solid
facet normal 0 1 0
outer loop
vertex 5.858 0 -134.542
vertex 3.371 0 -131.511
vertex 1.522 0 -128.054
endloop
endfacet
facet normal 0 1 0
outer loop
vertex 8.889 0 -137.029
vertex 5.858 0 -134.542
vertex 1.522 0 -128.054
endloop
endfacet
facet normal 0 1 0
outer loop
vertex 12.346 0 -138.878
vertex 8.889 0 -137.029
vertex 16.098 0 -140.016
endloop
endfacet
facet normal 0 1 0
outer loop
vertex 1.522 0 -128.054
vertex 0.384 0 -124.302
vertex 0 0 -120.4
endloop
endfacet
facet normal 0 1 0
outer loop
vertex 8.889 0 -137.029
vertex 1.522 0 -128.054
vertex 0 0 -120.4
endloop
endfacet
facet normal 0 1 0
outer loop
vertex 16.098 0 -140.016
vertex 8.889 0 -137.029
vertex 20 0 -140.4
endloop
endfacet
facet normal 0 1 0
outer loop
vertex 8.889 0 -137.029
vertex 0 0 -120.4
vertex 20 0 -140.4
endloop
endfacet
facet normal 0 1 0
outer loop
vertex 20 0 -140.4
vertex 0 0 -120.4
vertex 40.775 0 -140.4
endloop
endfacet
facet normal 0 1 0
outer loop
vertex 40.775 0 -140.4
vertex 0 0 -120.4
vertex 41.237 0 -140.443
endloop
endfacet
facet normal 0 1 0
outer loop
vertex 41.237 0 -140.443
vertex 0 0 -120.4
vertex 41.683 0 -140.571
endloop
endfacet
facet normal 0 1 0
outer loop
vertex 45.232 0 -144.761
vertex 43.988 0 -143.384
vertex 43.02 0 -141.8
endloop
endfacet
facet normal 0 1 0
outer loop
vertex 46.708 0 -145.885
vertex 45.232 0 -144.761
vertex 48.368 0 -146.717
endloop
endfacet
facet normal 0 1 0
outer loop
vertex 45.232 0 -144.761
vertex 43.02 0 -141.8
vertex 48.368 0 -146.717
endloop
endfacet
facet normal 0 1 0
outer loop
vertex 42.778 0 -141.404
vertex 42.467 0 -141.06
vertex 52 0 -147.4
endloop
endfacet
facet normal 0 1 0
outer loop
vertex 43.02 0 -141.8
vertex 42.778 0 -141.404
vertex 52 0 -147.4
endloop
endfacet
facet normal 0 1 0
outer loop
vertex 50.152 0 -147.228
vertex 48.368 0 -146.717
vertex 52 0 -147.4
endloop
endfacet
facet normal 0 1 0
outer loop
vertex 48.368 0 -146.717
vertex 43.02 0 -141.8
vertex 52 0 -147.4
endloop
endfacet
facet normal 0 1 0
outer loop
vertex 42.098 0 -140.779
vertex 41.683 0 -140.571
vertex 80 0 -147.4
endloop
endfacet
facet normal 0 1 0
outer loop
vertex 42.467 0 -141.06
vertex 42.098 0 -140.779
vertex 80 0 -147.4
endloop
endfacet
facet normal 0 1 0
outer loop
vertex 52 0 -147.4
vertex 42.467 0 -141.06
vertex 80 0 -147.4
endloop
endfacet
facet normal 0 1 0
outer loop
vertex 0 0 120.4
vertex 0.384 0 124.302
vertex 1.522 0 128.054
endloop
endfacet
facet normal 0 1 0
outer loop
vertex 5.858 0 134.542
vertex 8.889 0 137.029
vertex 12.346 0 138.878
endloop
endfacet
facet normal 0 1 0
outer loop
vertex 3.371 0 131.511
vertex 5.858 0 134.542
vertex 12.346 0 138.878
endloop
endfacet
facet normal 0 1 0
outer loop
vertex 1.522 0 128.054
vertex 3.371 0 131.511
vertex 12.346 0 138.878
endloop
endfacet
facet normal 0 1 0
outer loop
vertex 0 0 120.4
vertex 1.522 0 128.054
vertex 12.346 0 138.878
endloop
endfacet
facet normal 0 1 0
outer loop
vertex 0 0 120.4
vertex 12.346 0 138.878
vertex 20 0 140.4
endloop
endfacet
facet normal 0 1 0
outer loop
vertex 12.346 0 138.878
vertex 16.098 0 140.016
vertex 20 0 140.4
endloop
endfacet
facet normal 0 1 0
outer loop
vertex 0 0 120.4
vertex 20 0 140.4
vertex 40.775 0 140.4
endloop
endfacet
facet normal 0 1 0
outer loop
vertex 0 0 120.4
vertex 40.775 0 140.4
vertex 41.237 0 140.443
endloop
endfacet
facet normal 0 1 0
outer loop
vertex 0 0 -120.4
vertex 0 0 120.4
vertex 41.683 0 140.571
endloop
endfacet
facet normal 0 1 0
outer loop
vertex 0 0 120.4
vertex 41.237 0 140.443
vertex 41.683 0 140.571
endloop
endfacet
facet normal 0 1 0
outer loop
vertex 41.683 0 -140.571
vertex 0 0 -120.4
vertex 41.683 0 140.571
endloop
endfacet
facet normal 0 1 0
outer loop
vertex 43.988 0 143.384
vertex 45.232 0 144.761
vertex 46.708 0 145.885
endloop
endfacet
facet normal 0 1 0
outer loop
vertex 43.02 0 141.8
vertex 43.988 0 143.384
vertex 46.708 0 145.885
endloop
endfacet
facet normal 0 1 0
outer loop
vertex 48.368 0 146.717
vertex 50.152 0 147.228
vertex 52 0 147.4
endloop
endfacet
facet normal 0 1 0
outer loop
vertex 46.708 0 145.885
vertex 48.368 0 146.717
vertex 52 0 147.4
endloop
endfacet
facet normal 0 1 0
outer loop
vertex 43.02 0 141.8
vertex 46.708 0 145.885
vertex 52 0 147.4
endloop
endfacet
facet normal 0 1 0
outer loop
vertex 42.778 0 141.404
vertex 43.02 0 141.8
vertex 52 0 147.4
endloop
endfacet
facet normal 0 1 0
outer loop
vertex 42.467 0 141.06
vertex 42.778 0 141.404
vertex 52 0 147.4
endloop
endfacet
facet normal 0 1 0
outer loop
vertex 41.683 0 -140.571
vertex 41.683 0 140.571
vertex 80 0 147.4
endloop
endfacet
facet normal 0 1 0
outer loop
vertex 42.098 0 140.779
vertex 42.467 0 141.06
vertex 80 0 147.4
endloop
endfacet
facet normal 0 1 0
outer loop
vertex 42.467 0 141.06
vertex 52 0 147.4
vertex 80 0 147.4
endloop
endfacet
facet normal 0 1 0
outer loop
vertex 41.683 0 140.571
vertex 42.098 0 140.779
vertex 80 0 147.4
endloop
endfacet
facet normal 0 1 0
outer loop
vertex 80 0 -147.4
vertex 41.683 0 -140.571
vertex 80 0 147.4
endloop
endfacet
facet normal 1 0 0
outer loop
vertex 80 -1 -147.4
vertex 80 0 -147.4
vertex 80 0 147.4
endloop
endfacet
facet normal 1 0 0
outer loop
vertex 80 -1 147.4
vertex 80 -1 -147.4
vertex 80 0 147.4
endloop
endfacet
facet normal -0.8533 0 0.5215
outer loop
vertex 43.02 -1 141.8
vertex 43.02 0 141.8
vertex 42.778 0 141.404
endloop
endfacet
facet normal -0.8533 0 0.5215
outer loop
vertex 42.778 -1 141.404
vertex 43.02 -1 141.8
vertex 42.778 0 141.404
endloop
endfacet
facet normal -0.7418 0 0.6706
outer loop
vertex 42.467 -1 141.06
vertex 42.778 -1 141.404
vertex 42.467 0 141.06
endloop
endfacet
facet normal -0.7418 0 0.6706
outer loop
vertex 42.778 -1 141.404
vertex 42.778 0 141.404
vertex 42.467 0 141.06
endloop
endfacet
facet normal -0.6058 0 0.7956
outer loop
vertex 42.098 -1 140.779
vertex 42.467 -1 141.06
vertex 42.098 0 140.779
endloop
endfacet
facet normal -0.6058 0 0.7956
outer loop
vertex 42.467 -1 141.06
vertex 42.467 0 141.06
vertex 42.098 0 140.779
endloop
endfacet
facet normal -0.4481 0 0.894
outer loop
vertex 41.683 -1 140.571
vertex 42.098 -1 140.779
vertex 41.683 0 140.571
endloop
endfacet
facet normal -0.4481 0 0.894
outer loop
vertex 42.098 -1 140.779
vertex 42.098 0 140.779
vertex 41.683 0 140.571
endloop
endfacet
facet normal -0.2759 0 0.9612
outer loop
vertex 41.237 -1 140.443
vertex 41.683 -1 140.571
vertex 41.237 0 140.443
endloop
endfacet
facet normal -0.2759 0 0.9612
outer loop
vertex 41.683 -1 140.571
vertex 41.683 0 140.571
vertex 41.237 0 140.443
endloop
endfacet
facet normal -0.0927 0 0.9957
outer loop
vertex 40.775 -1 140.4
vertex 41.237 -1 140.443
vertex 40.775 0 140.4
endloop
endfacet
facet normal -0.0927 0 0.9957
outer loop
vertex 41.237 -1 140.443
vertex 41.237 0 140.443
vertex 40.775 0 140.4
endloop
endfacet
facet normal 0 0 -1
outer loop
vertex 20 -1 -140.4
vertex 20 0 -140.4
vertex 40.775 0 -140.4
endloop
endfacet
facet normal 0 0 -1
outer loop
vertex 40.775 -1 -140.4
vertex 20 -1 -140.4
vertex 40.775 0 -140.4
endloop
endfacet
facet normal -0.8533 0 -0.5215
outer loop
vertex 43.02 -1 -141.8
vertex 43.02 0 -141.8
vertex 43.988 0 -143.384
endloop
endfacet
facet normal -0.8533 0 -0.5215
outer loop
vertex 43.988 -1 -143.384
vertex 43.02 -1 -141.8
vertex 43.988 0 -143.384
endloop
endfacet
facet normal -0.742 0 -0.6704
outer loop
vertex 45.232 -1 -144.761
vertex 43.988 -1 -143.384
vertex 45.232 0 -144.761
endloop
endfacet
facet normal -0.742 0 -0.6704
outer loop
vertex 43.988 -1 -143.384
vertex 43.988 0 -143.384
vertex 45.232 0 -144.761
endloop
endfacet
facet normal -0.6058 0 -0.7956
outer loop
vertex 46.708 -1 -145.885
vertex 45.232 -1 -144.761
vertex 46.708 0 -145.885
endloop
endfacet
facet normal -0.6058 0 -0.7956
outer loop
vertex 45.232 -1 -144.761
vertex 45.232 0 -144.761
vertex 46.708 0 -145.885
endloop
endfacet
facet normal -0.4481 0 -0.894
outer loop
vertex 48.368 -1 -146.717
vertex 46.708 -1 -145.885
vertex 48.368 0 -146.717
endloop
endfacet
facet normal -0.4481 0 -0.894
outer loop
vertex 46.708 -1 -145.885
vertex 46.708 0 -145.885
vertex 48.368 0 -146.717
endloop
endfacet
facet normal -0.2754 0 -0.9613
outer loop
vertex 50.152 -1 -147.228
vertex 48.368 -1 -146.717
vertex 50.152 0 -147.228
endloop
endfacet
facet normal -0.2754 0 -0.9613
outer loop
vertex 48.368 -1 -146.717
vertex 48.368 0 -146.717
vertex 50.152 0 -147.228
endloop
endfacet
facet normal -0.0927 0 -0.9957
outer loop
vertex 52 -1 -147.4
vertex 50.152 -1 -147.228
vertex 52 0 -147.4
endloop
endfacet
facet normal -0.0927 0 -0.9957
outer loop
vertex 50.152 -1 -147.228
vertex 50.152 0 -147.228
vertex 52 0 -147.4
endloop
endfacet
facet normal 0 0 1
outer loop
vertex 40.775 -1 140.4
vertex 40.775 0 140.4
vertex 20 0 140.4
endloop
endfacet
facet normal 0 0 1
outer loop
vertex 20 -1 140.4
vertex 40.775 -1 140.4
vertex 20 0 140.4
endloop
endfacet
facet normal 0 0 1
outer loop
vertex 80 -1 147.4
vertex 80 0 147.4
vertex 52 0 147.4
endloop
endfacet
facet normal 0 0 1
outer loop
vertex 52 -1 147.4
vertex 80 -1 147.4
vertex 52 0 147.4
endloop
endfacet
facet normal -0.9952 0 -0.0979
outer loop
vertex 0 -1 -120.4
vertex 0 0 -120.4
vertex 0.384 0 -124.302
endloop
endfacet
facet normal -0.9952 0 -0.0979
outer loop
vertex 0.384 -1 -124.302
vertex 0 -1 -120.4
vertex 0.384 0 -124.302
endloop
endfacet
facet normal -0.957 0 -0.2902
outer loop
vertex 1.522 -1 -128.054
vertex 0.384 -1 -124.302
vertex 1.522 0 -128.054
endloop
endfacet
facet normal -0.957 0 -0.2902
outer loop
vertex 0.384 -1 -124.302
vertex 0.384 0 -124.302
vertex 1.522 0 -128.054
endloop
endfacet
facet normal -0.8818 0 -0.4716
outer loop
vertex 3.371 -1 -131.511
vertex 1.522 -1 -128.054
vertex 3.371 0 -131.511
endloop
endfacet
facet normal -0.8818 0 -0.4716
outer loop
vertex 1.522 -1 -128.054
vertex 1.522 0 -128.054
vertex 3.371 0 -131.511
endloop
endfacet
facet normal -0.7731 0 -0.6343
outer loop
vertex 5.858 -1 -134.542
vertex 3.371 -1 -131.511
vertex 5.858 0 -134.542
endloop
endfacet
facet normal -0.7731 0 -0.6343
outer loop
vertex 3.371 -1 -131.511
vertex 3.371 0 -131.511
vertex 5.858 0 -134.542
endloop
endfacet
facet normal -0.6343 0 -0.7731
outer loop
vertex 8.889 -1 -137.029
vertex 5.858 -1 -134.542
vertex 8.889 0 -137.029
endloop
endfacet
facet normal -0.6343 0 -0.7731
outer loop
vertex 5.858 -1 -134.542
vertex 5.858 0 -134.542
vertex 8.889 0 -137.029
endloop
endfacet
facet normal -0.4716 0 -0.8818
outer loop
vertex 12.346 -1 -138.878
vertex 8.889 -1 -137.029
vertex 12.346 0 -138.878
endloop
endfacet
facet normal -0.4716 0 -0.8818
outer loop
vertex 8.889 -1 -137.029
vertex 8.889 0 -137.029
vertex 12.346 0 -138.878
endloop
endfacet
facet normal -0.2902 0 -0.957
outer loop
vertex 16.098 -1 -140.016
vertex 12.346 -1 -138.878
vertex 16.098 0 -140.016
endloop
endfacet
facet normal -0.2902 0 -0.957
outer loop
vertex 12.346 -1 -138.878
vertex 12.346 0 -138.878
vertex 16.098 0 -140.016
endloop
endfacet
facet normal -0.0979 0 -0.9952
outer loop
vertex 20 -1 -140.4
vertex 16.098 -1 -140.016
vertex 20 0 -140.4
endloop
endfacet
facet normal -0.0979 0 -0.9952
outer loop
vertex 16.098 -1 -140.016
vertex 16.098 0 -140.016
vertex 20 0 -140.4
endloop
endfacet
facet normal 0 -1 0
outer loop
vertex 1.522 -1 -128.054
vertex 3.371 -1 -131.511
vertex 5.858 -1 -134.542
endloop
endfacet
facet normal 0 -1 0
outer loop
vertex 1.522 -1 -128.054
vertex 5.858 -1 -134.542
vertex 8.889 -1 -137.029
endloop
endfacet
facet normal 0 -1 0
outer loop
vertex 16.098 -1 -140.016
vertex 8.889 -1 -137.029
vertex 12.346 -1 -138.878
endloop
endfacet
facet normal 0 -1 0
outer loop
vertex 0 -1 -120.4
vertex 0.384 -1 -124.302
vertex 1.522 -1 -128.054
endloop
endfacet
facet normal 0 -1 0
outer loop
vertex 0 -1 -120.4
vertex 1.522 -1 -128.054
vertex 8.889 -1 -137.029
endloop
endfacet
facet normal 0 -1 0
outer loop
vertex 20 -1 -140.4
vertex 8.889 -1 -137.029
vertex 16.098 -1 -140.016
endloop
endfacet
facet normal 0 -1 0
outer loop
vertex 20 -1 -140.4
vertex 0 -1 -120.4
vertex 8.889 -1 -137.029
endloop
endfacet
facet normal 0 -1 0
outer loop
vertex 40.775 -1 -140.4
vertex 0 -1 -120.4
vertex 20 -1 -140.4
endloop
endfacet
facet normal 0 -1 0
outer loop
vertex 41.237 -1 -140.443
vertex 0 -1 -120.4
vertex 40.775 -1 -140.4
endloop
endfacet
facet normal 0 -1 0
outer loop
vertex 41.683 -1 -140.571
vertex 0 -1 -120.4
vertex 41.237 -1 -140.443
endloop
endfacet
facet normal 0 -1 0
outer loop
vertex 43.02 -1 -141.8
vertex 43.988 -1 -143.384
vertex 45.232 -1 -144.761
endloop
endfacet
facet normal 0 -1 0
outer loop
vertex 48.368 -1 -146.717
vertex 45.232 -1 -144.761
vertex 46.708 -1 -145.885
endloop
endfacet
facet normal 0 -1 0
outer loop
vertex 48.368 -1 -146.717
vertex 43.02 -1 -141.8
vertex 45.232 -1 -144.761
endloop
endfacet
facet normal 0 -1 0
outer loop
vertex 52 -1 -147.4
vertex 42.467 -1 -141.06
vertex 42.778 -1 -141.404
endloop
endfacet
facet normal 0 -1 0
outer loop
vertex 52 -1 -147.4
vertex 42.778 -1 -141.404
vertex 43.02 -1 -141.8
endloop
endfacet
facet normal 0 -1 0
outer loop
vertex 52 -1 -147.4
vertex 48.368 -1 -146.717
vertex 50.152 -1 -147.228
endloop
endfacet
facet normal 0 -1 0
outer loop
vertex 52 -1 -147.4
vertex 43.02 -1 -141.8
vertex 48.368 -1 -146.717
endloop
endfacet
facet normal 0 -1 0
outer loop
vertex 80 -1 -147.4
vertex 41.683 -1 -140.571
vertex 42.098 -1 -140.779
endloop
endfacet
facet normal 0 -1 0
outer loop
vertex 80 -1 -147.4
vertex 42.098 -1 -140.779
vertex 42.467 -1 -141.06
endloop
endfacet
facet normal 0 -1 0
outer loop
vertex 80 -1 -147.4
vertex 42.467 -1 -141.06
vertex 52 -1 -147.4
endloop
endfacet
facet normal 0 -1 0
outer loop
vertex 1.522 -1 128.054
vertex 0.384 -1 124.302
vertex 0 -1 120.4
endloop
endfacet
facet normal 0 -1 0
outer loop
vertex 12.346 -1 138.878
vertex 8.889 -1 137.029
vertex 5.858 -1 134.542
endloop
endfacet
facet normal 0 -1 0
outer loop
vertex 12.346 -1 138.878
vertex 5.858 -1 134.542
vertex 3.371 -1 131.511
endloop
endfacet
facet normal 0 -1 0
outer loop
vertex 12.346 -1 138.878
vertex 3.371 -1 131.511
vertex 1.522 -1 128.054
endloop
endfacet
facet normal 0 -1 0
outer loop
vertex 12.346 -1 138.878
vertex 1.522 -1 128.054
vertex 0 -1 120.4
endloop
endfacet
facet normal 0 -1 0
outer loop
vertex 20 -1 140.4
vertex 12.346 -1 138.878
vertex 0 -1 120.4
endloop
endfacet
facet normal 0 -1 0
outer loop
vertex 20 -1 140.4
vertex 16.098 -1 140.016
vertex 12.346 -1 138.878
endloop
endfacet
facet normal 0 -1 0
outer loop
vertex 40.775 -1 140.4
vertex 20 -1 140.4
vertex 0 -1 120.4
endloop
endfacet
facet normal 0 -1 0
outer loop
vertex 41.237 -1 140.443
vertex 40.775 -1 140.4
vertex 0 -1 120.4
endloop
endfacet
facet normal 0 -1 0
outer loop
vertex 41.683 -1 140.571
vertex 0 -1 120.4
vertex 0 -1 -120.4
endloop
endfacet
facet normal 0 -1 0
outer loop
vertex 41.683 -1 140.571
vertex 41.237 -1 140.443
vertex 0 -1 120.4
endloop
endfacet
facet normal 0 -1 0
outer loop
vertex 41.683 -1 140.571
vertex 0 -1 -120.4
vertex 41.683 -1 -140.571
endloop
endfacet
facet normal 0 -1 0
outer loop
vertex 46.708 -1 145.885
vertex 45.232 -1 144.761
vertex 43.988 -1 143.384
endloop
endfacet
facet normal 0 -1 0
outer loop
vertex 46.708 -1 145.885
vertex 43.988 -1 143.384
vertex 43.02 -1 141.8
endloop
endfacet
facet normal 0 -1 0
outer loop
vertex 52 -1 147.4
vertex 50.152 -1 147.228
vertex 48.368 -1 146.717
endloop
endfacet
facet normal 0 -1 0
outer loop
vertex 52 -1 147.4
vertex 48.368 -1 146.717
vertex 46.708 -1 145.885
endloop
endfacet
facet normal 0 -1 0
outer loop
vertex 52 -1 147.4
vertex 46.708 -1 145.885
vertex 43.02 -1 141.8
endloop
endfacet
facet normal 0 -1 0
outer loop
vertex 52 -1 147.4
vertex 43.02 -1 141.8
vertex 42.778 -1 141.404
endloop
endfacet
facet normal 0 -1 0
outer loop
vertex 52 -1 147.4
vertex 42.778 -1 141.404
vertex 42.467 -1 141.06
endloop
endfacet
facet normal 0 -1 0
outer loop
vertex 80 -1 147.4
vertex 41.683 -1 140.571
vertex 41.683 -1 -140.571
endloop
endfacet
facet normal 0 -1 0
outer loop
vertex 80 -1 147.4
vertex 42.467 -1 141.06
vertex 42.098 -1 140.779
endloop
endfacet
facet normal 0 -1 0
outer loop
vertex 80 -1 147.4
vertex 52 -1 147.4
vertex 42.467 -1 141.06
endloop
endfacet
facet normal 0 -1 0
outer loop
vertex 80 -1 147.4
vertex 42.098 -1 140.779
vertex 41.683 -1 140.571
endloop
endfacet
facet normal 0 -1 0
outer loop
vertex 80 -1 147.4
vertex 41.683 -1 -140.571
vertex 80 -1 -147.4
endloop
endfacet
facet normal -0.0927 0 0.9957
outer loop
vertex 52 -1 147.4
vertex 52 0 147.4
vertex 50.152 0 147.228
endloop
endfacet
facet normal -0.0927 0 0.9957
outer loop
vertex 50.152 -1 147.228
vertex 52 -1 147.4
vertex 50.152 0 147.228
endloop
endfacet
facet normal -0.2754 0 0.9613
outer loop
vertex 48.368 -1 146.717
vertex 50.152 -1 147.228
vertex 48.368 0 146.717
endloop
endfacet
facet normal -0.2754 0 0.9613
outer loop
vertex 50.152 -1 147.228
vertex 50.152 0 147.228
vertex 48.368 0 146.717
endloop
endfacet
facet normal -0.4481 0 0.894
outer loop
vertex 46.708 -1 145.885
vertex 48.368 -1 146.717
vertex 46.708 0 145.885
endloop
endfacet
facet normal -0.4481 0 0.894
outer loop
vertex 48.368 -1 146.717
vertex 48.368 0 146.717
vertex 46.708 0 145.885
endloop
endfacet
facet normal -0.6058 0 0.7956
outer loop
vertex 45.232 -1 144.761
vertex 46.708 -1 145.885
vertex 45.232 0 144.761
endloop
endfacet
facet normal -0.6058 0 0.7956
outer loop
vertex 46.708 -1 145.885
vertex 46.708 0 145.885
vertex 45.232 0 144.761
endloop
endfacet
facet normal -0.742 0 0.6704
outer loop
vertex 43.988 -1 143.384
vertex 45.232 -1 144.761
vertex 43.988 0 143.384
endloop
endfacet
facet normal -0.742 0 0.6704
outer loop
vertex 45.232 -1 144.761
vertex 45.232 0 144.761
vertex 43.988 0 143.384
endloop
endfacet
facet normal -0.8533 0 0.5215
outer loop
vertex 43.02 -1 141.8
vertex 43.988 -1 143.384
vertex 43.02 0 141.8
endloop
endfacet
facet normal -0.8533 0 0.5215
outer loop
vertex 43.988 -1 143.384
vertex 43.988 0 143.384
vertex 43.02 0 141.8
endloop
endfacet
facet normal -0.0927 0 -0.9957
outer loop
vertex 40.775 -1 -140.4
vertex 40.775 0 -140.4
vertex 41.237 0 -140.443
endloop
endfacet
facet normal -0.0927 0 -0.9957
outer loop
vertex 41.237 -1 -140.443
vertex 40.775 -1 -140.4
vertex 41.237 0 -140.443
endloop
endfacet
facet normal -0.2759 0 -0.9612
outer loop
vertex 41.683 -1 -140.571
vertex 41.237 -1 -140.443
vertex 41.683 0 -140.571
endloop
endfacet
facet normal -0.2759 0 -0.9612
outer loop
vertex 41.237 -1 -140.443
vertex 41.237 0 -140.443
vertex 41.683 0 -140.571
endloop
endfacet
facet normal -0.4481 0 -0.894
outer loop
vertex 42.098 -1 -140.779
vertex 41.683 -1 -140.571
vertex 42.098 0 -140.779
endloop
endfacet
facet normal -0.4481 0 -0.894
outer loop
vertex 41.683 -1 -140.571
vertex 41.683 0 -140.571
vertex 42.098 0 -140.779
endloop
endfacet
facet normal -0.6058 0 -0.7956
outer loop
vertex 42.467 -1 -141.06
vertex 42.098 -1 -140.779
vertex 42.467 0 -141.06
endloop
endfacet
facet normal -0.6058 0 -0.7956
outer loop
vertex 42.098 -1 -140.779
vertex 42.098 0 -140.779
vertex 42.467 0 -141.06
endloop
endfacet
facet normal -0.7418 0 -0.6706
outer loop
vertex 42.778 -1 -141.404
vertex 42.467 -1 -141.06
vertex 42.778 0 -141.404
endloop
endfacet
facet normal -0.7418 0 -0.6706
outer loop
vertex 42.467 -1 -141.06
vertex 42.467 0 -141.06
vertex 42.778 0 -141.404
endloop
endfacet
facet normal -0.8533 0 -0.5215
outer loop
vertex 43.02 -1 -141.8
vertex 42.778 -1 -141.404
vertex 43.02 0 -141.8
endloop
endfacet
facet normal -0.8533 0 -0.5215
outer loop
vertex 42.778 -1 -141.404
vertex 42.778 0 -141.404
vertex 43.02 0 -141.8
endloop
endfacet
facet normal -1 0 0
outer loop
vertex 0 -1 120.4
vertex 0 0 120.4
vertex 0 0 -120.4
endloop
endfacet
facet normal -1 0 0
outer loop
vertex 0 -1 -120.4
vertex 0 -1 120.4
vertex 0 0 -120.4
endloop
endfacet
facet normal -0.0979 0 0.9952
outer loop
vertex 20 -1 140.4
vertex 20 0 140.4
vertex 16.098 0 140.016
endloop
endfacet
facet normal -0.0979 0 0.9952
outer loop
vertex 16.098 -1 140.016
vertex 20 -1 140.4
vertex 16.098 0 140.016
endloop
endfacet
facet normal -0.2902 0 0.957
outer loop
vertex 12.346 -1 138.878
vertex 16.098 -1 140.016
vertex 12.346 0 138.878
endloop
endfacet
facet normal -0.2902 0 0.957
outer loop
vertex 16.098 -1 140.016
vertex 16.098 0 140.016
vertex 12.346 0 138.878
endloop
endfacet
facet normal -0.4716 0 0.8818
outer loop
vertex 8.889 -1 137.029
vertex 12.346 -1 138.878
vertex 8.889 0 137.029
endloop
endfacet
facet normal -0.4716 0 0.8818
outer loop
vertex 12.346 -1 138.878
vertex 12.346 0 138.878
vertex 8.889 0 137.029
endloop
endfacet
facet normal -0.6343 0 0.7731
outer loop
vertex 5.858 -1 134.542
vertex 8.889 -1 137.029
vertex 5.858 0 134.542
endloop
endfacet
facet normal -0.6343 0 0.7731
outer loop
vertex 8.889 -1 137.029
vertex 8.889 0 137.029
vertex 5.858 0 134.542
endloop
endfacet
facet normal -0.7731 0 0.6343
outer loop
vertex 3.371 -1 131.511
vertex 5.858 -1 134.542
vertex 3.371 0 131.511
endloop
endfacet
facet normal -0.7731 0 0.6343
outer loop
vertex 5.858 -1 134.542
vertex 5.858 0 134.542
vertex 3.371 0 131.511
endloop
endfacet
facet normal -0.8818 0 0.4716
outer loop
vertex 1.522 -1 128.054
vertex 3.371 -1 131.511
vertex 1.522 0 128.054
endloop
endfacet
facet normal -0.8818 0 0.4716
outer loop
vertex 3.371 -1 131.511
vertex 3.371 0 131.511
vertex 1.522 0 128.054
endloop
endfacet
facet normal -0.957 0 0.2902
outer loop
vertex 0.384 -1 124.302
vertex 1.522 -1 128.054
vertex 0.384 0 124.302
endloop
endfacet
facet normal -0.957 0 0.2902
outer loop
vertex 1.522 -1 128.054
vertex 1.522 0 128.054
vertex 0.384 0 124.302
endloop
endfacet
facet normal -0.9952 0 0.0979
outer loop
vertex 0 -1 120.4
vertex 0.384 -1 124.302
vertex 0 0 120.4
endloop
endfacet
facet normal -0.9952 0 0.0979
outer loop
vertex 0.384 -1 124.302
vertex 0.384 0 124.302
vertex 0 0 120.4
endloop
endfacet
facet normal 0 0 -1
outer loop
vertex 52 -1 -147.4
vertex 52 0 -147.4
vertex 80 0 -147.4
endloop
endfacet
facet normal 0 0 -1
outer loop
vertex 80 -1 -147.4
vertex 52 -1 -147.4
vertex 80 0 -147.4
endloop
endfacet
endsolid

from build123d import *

# Parameters (mm, degrees)
F1_DEPTH = 1


with BuildPart() as f1:
    # F0 (on Front) → F1 (new body)
    with BuildSketch(Plane.XZ):
        with BuildLine():
            Line((0, 120.4), (0, 0))
            Line((0, 0), (0, -120.4))
            ThreePointArc((0, -120.4), (5.857864, -134.542136), (20, -140.4))
            Line((20, -140.4), (40.775028, -140.4))
            ThreePointArc((40.775028, -140.4), (42.097903, -140.77868), (43.020022, -141.8))
            ThreePointArc((43.020022, -141.8), (46.708497, -145.885281), (52, -147.4))
            Line((52, -147.4), (80, -147.4))
            Line((80, -147.4), (80, 0))
            Line((80, 0), (80, 147.4))
            Line((80, 147.4), (52, 147.4))
            ThreePointArc((52, 147.4), (46.708497, 145.885281), (43.020022, 141.8))
            ThreePointArc((43.020022, 141.8), (42.097903, 140.77868), (40.775028, 140.4))
            Line((40.775028, 140.4), (20, 140.4))
            ThreePointArc((20, 140.4), (5.857864, 134.542136), (0, 120.4))
        make_face()
    extrude(amount=F1_DEPTH)


solid = f1.part
